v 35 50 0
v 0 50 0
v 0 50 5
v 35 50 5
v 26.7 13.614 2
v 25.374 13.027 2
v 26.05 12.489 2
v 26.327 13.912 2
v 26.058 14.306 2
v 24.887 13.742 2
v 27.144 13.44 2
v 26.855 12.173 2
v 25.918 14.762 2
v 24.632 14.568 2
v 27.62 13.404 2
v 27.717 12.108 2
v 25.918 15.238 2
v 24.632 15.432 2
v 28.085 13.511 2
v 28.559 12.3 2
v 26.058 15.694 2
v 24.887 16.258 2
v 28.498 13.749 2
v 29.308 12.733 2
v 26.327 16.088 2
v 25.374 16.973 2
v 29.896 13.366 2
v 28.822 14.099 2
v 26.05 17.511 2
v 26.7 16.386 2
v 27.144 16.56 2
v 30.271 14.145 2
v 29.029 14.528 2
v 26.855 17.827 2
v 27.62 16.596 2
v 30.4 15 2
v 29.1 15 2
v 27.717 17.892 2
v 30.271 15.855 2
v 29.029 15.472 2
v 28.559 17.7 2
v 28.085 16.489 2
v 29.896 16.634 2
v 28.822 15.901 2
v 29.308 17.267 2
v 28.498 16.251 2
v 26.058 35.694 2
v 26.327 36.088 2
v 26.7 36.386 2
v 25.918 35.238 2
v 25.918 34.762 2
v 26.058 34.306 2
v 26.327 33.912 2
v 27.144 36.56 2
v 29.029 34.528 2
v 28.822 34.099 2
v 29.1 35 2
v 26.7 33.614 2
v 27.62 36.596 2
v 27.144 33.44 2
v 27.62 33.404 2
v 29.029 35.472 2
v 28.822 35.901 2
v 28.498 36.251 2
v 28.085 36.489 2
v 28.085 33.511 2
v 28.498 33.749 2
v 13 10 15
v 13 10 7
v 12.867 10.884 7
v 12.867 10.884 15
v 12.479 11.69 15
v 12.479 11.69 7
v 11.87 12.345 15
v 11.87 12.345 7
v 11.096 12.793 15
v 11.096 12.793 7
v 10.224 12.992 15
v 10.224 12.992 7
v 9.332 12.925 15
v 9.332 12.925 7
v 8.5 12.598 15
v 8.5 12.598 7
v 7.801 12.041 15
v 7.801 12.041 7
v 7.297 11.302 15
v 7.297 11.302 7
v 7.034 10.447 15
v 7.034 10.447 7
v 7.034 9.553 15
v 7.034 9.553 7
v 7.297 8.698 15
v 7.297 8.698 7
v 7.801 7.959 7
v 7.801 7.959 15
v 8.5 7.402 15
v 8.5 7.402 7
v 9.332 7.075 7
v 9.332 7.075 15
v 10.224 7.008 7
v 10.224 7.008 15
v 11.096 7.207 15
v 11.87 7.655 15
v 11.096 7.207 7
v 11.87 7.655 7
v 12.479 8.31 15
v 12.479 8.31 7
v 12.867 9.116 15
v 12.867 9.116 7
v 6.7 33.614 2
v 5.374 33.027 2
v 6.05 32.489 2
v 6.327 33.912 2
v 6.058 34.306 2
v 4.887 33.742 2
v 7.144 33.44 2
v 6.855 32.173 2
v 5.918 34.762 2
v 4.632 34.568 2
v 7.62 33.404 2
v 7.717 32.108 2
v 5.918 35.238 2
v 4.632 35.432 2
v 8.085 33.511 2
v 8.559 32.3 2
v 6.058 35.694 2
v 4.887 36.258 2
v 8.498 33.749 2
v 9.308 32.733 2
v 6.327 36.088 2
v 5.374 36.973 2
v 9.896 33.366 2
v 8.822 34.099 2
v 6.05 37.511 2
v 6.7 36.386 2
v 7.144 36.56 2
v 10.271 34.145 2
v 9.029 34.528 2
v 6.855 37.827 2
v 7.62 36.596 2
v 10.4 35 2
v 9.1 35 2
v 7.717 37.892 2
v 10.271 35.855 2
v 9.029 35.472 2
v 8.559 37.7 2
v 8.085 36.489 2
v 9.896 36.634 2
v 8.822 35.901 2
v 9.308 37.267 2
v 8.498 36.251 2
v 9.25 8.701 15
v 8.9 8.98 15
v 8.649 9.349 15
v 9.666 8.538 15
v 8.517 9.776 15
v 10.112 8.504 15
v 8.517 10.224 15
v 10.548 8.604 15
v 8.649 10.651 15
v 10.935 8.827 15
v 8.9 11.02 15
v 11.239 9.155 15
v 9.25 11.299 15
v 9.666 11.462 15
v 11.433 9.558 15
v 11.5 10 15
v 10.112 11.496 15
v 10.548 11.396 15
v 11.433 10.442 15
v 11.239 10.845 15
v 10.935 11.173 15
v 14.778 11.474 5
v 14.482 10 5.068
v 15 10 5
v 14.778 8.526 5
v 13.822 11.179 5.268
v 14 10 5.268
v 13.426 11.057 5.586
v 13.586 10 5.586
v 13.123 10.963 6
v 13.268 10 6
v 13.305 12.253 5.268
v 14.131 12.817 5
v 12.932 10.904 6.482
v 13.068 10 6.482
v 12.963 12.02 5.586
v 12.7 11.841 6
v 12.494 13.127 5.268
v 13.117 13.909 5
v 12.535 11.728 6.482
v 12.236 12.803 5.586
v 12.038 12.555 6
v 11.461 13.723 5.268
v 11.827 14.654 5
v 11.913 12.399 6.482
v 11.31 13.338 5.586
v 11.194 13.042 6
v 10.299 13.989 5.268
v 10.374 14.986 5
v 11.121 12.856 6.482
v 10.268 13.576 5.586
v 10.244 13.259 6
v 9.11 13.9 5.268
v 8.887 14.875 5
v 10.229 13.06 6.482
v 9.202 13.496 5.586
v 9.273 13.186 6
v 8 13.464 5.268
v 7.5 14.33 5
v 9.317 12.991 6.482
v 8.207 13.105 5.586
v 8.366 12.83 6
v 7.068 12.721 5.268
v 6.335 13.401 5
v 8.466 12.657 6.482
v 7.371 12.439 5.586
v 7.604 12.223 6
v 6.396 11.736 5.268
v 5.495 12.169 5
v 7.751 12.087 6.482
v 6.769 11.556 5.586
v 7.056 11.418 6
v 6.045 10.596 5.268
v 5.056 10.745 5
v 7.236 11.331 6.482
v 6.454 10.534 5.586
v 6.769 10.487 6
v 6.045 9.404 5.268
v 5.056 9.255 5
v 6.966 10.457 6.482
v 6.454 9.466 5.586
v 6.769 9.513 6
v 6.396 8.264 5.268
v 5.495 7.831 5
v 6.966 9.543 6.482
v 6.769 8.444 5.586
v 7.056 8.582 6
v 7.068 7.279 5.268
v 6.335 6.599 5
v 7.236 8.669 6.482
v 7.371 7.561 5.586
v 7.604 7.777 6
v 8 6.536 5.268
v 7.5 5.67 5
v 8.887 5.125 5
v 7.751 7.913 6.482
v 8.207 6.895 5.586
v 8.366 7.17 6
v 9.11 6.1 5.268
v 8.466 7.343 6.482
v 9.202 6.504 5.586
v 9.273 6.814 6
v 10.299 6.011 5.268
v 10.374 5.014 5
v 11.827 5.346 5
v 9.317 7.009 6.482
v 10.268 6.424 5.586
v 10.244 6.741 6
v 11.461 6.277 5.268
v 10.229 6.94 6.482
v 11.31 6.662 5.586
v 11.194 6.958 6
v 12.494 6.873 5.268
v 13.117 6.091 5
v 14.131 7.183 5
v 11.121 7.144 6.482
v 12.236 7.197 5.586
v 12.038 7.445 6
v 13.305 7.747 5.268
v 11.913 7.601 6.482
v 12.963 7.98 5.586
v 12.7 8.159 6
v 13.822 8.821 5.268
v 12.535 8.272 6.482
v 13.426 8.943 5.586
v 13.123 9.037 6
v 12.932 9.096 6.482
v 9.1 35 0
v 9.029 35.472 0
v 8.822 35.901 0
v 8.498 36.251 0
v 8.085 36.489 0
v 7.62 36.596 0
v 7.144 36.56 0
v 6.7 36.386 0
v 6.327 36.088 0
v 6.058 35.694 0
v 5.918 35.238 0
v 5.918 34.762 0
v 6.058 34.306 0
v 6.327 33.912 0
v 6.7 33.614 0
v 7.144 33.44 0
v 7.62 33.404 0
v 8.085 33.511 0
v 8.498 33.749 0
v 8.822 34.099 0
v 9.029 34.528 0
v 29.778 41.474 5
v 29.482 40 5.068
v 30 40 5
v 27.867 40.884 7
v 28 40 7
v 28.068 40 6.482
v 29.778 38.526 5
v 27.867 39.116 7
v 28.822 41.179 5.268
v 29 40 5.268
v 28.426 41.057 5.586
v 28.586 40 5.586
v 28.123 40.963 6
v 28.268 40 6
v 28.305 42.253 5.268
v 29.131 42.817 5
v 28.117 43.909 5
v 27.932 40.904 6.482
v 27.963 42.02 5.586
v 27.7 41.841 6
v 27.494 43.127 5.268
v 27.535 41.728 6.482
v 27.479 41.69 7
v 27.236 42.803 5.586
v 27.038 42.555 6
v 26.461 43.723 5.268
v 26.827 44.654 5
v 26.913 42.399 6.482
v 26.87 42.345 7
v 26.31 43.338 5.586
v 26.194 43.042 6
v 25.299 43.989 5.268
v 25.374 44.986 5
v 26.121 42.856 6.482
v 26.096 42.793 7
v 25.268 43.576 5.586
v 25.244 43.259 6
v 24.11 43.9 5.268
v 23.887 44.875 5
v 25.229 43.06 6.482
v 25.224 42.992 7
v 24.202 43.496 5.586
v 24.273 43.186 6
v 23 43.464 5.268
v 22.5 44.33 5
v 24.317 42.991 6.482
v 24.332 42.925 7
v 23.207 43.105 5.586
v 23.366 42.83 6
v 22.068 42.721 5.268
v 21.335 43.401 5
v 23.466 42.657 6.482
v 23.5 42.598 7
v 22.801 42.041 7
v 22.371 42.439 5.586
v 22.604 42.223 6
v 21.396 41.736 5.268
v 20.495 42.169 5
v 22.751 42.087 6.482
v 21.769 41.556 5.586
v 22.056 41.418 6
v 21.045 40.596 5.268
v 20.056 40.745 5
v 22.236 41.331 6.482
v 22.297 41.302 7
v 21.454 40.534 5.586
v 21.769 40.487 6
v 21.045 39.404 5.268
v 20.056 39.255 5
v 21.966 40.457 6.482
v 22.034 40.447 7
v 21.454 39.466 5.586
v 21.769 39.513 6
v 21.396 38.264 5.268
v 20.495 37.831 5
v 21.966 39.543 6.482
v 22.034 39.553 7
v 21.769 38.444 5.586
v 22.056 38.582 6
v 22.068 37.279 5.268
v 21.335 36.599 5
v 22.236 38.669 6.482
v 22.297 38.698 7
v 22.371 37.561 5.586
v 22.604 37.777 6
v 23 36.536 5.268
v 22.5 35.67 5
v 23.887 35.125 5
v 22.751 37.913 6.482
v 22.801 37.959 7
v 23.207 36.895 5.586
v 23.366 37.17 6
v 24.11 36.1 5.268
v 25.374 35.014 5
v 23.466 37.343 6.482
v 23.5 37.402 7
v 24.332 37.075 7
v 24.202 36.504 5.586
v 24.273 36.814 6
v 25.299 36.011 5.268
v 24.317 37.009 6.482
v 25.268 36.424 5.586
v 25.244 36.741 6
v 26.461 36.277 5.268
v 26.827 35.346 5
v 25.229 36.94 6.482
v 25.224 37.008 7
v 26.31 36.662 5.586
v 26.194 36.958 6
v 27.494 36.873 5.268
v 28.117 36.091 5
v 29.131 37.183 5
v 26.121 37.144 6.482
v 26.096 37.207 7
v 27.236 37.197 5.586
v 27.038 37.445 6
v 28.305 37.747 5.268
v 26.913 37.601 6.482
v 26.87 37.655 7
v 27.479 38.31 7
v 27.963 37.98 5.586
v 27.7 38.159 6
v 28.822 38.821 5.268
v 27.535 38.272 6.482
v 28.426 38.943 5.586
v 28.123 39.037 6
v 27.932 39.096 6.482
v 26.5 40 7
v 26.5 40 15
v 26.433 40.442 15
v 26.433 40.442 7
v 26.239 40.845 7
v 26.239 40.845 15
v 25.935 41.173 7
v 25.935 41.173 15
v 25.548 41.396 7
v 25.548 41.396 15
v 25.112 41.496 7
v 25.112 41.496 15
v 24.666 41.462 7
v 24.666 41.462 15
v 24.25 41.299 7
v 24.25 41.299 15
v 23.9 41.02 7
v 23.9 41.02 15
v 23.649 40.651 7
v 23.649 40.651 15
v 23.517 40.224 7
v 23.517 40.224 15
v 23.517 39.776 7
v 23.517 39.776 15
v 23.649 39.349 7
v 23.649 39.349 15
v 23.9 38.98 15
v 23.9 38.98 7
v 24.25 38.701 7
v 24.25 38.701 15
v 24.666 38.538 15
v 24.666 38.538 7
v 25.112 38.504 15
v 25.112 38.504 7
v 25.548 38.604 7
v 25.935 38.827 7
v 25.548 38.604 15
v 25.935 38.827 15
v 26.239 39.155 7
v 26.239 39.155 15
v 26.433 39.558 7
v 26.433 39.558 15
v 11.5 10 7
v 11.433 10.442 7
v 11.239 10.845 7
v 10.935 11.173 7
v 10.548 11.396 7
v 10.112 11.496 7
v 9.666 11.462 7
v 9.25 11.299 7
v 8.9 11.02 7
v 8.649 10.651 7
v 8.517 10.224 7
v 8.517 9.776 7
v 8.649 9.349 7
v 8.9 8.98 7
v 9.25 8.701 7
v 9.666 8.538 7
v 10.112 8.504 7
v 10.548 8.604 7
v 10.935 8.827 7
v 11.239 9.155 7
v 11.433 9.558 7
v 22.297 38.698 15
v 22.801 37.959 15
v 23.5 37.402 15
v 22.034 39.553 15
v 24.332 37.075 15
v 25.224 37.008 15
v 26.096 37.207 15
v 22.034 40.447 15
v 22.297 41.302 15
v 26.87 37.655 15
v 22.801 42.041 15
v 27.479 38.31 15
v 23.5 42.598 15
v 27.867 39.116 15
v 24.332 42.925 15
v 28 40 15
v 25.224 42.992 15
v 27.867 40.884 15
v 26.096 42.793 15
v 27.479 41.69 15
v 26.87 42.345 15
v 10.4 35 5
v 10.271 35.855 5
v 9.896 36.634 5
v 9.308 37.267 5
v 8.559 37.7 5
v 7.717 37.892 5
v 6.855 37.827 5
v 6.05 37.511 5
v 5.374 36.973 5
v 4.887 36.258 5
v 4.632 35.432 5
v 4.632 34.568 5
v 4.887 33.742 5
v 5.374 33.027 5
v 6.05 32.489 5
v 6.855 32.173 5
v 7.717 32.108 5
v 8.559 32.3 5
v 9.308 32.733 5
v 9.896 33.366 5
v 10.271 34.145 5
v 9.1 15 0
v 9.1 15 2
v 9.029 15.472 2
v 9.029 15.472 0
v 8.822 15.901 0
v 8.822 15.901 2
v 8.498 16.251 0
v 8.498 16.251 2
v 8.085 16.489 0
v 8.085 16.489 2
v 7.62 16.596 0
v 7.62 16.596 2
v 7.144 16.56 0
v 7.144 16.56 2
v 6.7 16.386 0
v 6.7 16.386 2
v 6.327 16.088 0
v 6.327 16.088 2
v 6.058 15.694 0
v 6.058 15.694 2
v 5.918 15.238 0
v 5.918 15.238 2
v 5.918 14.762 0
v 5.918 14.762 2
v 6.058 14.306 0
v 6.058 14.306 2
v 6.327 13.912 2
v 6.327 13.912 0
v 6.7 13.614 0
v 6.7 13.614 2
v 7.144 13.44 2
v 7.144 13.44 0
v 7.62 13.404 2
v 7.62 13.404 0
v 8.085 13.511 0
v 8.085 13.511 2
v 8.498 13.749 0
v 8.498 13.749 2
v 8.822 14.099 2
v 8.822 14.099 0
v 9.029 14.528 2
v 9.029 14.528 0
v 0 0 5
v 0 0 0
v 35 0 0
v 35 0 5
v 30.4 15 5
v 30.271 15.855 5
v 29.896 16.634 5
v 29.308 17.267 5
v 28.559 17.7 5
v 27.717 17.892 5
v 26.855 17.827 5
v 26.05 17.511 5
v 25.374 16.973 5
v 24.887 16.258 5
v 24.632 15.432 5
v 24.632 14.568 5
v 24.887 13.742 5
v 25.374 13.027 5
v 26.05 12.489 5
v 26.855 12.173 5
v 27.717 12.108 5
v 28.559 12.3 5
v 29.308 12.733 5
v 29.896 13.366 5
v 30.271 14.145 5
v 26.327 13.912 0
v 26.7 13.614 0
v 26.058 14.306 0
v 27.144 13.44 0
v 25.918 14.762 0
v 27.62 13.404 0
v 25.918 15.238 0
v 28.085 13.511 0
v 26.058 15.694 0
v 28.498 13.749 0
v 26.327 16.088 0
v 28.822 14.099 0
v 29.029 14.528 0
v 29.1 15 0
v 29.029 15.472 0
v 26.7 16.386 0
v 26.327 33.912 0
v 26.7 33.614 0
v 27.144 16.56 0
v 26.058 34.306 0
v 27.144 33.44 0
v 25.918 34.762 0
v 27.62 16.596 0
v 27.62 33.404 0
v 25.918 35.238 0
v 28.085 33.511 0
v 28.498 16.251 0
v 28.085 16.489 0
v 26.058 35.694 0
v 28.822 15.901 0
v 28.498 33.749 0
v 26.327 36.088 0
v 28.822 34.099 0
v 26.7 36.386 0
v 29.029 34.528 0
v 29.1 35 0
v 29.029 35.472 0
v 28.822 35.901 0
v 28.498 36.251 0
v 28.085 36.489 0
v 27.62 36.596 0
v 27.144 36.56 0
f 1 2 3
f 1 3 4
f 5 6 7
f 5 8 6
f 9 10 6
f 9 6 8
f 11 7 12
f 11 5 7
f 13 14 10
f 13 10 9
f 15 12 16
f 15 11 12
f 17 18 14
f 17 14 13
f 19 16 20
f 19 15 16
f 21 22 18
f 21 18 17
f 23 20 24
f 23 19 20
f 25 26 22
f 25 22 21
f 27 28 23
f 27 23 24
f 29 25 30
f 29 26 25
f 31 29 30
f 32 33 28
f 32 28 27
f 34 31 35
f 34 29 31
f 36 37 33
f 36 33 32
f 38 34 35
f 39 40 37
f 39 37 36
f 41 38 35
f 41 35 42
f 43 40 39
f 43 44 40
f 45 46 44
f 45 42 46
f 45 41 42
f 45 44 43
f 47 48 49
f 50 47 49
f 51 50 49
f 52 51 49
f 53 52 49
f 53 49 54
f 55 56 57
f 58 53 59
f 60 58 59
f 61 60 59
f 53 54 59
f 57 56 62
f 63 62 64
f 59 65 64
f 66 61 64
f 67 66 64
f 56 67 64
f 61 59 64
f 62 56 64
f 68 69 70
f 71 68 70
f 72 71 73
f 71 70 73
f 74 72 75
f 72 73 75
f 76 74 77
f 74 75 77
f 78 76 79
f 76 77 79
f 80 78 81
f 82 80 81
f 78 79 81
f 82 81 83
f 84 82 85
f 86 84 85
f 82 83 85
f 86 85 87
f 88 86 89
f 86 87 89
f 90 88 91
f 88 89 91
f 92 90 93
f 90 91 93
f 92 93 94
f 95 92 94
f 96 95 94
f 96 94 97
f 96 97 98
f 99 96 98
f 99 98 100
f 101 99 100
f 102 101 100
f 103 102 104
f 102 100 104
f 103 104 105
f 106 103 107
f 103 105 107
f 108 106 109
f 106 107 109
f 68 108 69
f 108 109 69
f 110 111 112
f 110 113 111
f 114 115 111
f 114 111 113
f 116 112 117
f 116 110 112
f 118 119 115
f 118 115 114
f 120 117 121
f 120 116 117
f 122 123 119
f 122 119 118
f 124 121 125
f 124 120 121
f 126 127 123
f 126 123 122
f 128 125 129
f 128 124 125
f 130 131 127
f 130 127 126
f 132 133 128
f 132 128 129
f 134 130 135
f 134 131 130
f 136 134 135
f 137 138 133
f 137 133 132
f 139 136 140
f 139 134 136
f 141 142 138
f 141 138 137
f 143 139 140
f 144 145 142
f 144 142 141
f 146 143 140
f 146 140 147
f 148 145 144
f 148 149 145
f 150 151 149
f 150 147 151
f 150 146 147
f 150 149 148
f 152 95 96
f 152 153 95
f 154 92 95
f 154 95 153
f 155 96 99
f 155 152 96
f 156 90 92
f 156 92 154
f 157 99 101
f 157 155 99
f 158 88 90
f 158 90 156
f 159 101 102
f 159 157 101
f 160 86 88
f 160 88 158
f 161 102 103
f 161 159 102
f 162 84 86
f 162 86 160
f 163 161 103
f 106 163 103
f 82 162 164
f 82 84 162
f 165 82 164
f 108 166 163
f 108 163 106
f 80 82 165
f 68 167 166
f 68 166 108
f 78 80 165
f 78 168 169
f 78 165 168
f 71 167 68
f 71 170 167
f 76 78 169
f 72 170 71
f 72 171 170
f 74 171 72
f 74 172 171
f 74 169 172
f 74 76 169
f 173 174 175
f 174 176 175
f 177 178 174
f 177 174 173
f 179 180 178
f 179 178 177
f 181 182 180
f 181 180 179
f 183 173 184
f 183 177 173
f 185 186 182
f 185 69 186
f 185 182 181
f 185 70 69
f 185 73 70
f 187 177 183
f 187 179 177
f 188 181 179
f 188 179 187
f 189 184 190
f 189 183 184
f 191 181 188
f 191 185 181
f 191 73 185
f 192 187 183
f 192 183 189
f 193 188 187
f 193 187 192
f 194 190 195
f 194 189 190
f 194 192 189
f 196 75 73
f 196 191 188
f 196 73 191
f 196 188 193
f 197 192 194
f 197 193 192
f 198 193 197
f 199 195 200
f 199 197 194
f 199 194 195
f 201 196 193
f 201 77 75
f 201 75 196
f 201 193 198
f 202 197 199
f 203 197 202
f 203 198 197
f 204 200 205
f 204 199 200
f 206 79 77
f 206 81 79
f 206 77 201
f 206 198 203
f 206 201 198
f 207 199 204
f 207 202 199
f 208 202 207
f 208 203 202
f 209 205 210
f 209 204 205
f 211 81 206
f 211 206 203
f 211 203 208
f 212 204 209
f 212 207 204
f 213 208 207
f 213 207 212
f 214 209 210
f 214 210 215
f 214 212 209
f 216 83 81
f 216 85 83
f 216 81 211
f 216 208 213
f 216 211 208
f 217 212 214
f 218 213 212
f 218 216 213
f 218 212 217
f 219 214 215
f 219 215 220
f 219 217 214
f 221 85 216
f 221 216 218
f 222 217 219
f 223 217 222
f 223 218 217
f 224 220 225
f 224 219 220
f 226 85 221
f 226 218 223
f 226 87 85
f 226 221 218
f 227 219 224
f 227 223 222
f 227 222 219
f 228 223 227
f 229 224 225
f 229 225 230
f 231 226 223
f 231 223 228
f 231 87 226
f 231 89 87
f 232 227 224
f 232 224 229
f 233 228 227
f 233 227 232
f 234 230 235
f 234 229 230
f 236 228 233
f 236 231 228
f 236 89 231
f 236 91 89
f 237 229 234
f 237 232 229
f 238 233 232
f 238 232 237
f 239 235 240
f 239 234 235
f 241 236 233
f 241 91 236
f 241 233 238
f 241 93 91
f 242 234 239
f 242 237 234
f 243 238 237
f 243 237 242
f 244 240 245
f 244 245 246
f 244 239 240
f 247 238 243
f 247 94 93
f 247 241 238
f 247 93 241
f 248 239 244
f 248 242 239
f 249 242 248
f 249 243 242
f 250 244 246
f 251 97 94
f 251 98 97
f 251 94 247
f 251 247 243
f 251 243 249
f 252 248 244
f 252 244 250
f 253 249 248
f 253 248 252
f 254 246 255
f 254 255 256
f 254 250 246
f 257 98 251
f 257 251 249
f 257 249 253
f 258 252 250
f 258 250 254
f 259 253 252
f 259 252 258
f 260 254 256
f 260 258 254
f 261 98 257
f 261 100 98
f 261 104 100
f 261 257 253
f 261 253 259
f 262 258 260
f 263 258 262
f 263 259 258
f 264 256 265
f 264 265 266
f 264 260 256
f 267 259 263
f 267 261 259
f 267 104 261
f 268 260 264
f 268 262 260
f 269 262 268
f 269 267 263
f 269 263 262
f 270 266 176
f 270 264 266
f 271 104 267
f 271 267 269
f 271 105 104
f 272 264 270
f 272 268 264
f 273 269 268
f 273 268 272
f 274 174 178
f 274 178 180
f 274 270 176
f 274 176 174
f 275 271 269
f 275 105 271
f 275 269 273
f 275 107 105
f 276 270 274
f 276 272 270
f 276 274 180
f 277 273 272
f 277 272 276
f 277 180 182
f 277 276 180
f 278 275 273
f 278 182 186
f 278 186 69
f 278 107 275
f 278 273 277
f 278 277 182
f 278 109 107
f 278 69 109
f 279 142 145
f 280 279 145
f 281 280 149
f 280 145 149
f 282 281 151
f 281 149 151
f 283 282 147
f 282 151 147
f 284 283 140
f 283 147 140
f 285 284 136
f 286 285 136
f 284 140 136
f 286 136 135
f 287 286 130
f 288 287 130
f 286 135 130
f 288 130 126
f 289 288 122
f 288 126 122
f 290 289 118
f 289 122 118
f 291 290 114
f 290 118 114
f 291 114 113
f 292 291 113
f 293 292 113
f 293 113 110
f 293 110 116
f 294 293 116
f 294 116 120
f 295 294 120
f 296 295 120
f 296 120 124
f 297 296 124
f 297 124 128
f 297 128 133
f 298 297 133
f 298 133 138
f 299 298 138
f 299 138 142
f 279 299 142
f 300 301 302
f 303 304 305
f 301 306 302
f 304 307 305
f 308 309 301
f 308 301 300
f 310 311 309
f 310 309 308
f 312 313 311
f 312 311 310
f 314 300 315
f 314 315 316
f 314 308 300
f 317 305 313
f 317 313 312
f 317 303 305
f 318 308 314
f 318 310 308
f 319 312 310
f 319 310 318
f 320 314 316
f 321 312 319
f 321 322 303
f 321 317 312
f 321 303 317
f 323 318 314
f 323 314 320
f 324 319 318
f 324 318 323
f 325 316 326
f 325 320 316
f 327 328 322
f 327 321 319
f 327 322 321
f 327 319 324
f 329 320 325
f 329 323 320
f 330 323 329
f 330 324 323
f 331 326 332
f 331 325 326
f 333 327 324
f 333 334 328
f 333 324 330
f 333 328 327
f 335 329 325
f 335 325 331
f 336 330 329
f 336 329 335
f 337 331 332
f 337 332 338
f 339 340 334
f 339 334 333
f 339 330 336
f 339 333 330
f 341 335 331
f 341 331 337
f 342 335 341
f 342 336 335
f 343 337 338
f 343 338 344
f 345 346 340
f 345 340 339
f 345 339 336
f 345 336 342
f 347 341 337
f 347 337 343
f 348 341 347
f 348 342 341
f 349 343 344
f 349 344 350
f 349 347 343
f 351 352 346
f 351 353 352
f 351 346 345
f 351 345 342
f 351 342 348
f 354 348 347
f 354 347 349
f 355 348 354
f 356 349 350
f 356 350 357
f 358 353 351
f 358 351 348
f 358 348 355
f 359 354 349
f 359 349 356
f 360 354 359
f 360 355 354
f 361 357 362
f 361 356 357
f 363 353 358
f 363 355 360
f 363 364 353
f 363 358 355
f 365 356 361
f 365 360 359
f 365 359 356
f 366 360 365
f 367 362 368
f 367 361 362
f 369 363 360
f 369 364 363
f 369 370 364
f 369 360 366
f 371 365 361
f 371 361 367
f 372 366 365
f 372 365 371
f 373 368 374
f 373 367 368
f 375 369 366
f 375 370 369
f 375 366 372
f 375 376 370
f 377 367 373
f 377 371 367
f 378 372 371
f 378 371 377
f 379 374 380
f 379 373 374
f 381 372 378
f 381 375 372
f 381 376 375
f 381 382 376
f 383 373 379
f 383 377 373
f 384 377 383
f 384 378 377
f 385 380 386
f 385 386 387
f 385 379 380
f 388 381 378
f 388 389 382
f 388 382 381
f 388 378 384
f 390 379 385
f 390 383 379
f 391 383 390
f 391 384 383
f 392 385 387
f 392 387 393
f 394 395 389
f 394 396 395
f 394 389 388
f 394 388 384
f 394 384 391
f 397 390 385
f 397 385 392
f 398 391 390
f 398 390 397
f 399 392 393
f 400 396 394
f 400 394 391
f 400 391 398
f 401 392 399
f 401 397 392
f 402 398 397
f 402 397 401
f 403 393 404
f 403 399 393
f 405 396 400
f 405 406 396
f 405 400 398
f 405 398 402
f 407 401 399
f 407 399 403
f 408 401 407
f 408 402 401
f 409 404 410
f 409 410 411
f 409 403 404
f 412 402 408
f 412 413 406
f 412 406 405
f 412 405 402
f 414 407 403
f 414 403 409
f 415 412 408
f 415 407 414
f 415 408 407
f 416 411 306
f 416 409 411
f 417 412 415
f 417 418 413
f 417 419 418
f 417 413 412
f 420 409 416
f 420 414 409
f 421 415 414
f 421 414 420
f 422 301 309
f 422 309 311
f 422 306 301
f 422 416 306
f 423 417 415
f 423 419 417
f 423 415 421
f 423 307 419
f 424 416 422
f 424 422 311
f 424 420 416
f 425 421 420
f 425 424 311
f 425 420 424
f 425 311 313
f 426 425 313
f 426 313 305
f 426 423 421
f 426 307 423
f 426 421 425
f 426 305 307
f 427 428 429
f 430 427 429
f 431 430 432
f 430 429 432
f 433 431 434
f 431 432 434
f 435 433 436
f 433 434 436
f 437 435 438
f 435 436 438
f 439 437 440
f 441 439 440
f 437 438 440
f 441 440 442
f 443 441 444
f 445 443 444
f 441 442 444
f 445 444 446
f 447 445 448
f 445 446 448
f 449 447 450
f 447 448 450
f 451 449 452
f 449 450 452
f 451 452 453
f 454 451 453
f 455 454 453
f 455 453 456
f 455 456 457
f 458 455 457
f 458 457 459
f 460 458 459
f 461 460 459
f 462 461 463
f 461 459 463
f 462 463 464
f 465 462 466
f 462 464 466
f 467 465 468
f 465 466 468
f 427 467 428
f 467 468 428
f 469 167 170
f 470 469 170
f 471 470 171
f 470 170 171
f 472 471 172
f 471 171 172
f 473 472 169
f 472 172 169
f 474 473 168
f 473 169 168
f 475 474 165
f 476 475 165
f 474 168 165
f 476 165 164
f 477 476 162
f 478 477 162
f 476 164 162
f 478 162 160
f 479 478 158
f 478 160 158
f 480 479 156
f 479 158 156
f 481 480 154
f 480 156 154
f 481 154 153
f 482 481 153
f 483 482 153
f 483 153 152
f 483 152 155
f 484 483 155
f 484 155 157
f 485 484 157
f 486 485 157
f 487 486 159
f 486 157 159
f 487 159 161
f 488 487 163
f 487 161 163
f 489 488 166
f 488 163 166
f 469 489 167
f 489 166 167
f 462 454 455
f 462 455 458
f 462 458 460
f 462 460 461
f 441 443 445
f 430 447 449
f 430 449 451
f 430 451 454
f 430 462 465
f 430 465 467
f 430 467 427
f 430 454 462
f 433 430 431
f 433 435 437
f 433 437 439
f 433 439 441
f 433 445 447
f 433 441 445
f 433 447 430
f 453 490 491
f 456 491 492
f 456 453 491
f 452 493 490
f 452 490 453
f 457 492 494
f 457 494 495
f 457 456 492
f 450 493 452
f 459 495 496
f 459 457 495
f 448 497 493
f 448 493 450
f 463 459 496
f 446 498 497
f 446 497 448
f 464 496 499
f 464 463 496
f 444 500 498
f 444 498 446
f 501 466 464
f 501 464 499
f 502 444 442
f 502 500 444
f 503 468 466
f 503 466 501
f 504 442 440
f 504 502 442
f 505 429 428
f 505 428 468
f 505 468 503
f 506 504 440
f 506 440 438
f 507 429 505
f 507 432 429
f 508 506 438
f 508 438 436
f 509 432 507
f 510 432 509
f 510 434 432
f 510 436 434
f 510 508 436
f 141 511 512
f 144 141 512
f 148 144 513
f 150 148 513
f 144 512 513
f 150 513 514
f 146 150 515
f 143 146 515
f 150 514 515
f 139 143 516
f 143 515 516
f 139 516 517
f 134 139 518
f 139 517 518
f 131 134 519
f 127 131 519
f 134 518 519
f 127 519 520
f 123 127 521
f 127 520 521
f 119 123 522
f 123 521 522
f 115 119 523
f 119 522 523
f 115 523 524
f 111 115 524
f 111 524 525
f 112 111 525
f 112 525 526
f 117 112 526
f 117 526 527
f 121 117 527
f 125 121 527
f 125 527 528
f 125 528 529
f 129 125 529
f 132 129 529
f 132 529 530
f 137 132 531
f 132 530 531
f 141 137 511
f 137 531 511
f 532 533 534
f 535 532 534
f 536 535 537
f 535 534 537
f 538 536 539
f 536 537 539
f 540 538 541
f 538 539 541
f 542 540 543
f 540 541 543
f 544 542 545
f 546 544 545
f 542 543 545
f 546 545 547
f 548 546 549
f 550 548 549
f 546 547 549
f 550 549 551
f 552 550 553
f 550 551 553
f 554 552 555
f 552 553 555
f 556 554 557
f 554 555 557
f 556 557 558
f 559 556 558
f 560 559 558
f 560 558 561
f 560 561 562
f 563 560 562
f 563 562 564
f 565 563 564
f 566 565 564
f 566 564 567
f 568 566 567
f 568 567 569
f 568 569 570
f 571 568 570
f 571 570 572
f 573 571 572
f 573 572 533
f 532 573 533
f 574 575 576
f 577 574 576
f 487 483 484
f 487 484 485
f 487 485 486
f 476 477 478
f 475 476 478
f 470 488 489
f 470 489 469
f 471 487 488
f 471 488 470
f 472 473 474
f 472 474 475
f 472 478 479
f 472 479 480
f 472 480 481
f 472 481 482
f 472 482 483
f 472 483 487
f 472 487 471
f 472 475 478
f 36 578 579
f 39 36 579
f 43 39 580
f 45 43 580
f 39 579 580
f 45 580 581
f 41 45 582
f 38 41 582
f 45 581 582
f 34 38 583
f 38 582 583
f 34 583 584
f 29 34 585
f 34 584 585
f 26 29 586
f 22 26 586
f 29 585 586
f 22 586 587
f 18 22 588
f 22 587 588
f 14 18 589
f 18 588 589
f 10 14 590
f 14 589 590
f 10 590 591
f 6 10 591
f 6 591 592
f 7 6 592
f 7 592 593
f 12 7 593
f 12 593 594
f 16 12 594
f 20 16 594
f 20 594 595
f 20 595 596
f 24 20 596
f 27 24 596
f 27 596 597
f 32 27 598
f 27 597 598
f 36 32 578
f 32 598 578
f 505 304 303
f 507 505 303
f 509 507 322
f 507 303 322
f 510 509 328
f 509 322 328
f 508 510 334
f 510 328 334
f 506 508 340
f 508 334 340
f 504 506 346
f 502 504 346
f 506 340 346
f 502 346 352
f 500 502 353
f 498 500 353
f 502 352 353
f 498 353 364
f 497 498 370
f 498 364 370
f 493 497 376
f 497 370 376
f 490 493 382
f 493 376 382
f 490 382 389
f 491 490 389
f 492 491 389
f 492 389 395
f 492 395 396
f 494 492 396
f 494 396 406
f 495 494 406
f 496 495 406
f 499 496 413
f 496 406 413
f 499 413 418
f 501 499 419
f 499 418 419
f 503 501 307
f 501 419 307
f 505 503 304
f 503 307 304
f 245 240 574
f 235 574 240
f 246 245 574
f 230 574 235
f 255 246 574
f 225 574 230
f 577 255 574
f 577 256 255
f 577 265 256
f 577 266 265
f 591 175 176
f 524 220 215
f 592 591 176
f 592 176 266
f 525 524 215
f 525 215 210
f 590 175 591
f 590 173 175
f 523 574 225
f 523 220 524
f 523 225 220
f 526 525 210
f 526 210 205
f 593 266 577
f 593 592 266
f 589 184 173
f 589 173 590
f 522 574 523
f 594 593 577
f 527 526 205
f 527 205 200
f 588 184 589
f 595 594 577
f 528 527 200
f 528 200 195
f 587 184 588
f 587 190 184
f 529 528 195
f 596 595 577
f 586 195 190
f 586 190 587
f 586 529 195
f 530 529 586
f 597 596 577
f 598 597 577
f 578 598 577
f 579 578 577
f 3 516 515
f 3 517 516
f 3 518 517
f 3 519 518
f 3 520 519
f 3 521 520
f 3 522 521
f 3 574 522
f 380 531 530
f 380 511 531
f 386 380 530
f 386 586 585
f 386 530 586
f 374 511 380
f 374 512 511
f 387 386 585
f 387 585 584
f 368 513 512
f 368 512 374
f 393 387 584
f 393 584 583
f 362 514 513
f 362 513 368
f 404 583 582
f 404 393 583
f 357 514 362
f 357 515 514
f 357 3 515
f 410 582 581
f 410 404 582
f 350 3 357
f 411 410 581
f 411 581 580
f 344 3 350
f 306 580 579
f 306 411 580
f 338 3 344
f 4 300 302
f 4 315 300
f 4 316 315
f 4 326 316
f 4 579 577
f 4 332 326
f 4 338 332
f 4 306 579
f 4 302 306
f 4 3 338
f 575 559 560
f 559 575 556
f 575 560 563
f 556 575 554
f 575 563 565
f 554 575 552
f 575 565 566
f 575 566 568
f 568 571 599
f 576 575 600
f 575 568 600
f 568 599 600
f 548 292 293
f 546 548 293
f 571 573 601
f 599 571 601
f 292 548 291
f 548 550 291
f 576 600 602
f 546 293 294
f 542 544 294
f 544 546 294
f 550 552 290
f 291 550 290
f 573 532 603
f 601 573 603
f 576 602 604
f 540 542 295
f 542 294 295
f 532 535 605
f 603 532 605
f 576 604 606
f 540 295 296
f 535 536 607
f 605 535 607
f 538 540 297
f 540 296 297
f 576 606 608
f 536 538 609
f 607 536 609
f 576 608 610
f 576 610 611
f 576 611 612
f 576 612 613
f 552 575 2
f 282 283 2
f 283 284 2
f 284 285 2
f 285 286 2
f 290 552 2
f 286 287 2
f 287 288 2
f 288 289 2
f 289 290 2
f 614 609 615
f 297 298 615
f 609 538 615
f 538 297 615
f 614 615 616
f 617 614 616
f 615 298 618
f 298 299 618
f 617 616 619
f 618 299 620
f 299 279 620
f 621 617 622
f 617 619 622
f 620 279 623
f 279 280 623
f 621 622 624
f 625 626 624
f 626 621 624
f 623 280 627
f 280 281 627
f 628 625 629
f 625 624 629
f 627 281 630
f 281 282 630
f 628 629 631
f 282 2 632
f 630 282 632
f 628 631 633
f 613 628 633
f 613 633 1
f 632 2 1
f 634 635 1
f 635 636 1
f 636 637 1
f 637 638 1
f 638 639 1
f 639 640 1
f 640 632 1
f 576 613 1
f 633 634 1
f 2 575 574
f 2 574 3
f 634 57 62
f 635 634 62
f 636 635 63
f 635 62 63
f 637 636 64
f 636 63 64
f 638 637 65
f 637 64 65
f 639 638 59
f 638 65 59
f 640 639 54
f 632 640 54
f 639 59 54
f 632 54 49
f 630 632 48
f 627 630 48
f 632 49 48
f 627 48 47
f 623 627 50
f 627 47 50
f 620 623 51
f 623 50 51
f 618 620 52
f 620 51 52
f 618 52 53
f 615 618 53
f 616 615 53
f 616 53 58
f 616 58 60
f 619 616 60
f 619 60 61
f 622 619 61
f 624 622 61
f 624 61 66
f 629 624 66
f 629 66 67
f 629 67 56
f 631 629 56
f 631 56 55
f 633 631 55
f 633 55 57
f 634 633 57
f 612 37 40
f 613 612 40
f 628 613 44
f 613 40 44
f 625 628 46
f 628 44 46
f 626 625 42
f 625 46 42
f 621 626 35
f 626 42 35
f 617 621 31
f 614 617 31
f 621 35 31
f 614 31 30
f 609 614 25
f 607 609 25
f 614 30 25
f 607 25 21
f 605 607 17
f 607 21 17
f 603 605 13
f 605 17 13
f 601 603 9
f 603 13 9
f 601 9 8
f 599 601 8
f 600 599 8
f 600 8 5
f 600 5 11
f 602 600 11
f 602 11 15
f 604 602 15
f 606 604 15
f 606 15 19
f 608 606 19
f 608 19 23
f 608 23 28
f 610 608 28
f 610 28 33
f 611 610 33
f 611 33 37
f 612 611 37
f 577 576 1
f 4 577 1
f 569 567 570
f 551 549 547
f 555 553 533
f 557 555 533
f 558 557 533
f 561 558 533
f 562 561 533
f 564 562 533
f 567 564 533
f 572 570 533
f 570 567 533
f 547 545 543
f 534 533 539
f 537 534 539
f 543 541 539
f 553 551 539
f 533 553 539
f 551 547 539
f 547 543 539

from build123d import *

# Parameters (mm, degrees)
SKETCH_W        = 35
SKETCH_H        = 50
PAD_DEPTH       = 5
SKETCH004_R     = 2.9
POCKET_DEPTH    = 3
SKETCH005_R     = 1.6
POCKET001_DEPTH = 5
SKETCH006_R     = 3
PAD001_DEPTH    = 10
SKETCH007_R     = 1.5
POCKET002_DEPTH = 8
FILLET_R        = 2


with BuildPart() as part:
    # Sketch → Pad (new body)
    with BuildSketch(Plane.XY):
        with Locations((17.5, 25)):
            Rectangle(SKETCH_W, SKETCH_H)
    extrude(amount=PAD_DEPTH)

    # Sketch004 → Pocket (cut)
    with BuildSketch(Plane.XY.offset(5)):
        with Locations((7.5, 35)):
            Circle(SKETCH004_R)
        with Locations((27.5, 15)):
            Circle(SKETCH004_R)
    extrude(amount=-POCKET_DEPTH, mode=Mode.SUBTRACT)

    # Sketch005 → Pocket001 (cut)
    with BuildSketch(Plane.XY.offset(2)):
        with Locations((7.5, 15)):
            Circle(SKETCH005_R)
        with Locations((7.5, 35)):
            Circle(SKETCH005_R)
        with Locations((27.5, 15)):
            Circle(SKETCH005_R)
        with Locations((27.5, 35)):
            Circle(SKETCH005_R)
    extrude(amount=-POCKET001_DEPTH, mode=Mode.SUBTRACT)

    # Sketch006 → Pad001 (new body)
    with BuildSketch(Plane.XY.offset(5)):
        with Locations((10, 10)):
            Circle(SKETCH006_R)
        with Locations((25, 40)):
            Circle(SKETCH006_R)
    extrude(amount=PAD001_DEPTH)

    # Sketch007 → Pocket002 (cut)
    with BuildSketch(Plane.XY.offset(15)):
        with Locations((10, 10)):
            Circle(SKETCH007_R)
        with Locations((25, 40)):
            Circle(SKETCH007_R)
    extrude(amount=-POCKET002_DEPTH, mode=Mode.SUBTRACT)

    # Fillet
    fillet_edges = [part.edges().sort_by_distance(p)[0] for p in [
        (22, 40, 5),
        (7, 10, 5),
    ]]
    fillet(fillet_edges, radius=FILLET_R)


solid = part.part
